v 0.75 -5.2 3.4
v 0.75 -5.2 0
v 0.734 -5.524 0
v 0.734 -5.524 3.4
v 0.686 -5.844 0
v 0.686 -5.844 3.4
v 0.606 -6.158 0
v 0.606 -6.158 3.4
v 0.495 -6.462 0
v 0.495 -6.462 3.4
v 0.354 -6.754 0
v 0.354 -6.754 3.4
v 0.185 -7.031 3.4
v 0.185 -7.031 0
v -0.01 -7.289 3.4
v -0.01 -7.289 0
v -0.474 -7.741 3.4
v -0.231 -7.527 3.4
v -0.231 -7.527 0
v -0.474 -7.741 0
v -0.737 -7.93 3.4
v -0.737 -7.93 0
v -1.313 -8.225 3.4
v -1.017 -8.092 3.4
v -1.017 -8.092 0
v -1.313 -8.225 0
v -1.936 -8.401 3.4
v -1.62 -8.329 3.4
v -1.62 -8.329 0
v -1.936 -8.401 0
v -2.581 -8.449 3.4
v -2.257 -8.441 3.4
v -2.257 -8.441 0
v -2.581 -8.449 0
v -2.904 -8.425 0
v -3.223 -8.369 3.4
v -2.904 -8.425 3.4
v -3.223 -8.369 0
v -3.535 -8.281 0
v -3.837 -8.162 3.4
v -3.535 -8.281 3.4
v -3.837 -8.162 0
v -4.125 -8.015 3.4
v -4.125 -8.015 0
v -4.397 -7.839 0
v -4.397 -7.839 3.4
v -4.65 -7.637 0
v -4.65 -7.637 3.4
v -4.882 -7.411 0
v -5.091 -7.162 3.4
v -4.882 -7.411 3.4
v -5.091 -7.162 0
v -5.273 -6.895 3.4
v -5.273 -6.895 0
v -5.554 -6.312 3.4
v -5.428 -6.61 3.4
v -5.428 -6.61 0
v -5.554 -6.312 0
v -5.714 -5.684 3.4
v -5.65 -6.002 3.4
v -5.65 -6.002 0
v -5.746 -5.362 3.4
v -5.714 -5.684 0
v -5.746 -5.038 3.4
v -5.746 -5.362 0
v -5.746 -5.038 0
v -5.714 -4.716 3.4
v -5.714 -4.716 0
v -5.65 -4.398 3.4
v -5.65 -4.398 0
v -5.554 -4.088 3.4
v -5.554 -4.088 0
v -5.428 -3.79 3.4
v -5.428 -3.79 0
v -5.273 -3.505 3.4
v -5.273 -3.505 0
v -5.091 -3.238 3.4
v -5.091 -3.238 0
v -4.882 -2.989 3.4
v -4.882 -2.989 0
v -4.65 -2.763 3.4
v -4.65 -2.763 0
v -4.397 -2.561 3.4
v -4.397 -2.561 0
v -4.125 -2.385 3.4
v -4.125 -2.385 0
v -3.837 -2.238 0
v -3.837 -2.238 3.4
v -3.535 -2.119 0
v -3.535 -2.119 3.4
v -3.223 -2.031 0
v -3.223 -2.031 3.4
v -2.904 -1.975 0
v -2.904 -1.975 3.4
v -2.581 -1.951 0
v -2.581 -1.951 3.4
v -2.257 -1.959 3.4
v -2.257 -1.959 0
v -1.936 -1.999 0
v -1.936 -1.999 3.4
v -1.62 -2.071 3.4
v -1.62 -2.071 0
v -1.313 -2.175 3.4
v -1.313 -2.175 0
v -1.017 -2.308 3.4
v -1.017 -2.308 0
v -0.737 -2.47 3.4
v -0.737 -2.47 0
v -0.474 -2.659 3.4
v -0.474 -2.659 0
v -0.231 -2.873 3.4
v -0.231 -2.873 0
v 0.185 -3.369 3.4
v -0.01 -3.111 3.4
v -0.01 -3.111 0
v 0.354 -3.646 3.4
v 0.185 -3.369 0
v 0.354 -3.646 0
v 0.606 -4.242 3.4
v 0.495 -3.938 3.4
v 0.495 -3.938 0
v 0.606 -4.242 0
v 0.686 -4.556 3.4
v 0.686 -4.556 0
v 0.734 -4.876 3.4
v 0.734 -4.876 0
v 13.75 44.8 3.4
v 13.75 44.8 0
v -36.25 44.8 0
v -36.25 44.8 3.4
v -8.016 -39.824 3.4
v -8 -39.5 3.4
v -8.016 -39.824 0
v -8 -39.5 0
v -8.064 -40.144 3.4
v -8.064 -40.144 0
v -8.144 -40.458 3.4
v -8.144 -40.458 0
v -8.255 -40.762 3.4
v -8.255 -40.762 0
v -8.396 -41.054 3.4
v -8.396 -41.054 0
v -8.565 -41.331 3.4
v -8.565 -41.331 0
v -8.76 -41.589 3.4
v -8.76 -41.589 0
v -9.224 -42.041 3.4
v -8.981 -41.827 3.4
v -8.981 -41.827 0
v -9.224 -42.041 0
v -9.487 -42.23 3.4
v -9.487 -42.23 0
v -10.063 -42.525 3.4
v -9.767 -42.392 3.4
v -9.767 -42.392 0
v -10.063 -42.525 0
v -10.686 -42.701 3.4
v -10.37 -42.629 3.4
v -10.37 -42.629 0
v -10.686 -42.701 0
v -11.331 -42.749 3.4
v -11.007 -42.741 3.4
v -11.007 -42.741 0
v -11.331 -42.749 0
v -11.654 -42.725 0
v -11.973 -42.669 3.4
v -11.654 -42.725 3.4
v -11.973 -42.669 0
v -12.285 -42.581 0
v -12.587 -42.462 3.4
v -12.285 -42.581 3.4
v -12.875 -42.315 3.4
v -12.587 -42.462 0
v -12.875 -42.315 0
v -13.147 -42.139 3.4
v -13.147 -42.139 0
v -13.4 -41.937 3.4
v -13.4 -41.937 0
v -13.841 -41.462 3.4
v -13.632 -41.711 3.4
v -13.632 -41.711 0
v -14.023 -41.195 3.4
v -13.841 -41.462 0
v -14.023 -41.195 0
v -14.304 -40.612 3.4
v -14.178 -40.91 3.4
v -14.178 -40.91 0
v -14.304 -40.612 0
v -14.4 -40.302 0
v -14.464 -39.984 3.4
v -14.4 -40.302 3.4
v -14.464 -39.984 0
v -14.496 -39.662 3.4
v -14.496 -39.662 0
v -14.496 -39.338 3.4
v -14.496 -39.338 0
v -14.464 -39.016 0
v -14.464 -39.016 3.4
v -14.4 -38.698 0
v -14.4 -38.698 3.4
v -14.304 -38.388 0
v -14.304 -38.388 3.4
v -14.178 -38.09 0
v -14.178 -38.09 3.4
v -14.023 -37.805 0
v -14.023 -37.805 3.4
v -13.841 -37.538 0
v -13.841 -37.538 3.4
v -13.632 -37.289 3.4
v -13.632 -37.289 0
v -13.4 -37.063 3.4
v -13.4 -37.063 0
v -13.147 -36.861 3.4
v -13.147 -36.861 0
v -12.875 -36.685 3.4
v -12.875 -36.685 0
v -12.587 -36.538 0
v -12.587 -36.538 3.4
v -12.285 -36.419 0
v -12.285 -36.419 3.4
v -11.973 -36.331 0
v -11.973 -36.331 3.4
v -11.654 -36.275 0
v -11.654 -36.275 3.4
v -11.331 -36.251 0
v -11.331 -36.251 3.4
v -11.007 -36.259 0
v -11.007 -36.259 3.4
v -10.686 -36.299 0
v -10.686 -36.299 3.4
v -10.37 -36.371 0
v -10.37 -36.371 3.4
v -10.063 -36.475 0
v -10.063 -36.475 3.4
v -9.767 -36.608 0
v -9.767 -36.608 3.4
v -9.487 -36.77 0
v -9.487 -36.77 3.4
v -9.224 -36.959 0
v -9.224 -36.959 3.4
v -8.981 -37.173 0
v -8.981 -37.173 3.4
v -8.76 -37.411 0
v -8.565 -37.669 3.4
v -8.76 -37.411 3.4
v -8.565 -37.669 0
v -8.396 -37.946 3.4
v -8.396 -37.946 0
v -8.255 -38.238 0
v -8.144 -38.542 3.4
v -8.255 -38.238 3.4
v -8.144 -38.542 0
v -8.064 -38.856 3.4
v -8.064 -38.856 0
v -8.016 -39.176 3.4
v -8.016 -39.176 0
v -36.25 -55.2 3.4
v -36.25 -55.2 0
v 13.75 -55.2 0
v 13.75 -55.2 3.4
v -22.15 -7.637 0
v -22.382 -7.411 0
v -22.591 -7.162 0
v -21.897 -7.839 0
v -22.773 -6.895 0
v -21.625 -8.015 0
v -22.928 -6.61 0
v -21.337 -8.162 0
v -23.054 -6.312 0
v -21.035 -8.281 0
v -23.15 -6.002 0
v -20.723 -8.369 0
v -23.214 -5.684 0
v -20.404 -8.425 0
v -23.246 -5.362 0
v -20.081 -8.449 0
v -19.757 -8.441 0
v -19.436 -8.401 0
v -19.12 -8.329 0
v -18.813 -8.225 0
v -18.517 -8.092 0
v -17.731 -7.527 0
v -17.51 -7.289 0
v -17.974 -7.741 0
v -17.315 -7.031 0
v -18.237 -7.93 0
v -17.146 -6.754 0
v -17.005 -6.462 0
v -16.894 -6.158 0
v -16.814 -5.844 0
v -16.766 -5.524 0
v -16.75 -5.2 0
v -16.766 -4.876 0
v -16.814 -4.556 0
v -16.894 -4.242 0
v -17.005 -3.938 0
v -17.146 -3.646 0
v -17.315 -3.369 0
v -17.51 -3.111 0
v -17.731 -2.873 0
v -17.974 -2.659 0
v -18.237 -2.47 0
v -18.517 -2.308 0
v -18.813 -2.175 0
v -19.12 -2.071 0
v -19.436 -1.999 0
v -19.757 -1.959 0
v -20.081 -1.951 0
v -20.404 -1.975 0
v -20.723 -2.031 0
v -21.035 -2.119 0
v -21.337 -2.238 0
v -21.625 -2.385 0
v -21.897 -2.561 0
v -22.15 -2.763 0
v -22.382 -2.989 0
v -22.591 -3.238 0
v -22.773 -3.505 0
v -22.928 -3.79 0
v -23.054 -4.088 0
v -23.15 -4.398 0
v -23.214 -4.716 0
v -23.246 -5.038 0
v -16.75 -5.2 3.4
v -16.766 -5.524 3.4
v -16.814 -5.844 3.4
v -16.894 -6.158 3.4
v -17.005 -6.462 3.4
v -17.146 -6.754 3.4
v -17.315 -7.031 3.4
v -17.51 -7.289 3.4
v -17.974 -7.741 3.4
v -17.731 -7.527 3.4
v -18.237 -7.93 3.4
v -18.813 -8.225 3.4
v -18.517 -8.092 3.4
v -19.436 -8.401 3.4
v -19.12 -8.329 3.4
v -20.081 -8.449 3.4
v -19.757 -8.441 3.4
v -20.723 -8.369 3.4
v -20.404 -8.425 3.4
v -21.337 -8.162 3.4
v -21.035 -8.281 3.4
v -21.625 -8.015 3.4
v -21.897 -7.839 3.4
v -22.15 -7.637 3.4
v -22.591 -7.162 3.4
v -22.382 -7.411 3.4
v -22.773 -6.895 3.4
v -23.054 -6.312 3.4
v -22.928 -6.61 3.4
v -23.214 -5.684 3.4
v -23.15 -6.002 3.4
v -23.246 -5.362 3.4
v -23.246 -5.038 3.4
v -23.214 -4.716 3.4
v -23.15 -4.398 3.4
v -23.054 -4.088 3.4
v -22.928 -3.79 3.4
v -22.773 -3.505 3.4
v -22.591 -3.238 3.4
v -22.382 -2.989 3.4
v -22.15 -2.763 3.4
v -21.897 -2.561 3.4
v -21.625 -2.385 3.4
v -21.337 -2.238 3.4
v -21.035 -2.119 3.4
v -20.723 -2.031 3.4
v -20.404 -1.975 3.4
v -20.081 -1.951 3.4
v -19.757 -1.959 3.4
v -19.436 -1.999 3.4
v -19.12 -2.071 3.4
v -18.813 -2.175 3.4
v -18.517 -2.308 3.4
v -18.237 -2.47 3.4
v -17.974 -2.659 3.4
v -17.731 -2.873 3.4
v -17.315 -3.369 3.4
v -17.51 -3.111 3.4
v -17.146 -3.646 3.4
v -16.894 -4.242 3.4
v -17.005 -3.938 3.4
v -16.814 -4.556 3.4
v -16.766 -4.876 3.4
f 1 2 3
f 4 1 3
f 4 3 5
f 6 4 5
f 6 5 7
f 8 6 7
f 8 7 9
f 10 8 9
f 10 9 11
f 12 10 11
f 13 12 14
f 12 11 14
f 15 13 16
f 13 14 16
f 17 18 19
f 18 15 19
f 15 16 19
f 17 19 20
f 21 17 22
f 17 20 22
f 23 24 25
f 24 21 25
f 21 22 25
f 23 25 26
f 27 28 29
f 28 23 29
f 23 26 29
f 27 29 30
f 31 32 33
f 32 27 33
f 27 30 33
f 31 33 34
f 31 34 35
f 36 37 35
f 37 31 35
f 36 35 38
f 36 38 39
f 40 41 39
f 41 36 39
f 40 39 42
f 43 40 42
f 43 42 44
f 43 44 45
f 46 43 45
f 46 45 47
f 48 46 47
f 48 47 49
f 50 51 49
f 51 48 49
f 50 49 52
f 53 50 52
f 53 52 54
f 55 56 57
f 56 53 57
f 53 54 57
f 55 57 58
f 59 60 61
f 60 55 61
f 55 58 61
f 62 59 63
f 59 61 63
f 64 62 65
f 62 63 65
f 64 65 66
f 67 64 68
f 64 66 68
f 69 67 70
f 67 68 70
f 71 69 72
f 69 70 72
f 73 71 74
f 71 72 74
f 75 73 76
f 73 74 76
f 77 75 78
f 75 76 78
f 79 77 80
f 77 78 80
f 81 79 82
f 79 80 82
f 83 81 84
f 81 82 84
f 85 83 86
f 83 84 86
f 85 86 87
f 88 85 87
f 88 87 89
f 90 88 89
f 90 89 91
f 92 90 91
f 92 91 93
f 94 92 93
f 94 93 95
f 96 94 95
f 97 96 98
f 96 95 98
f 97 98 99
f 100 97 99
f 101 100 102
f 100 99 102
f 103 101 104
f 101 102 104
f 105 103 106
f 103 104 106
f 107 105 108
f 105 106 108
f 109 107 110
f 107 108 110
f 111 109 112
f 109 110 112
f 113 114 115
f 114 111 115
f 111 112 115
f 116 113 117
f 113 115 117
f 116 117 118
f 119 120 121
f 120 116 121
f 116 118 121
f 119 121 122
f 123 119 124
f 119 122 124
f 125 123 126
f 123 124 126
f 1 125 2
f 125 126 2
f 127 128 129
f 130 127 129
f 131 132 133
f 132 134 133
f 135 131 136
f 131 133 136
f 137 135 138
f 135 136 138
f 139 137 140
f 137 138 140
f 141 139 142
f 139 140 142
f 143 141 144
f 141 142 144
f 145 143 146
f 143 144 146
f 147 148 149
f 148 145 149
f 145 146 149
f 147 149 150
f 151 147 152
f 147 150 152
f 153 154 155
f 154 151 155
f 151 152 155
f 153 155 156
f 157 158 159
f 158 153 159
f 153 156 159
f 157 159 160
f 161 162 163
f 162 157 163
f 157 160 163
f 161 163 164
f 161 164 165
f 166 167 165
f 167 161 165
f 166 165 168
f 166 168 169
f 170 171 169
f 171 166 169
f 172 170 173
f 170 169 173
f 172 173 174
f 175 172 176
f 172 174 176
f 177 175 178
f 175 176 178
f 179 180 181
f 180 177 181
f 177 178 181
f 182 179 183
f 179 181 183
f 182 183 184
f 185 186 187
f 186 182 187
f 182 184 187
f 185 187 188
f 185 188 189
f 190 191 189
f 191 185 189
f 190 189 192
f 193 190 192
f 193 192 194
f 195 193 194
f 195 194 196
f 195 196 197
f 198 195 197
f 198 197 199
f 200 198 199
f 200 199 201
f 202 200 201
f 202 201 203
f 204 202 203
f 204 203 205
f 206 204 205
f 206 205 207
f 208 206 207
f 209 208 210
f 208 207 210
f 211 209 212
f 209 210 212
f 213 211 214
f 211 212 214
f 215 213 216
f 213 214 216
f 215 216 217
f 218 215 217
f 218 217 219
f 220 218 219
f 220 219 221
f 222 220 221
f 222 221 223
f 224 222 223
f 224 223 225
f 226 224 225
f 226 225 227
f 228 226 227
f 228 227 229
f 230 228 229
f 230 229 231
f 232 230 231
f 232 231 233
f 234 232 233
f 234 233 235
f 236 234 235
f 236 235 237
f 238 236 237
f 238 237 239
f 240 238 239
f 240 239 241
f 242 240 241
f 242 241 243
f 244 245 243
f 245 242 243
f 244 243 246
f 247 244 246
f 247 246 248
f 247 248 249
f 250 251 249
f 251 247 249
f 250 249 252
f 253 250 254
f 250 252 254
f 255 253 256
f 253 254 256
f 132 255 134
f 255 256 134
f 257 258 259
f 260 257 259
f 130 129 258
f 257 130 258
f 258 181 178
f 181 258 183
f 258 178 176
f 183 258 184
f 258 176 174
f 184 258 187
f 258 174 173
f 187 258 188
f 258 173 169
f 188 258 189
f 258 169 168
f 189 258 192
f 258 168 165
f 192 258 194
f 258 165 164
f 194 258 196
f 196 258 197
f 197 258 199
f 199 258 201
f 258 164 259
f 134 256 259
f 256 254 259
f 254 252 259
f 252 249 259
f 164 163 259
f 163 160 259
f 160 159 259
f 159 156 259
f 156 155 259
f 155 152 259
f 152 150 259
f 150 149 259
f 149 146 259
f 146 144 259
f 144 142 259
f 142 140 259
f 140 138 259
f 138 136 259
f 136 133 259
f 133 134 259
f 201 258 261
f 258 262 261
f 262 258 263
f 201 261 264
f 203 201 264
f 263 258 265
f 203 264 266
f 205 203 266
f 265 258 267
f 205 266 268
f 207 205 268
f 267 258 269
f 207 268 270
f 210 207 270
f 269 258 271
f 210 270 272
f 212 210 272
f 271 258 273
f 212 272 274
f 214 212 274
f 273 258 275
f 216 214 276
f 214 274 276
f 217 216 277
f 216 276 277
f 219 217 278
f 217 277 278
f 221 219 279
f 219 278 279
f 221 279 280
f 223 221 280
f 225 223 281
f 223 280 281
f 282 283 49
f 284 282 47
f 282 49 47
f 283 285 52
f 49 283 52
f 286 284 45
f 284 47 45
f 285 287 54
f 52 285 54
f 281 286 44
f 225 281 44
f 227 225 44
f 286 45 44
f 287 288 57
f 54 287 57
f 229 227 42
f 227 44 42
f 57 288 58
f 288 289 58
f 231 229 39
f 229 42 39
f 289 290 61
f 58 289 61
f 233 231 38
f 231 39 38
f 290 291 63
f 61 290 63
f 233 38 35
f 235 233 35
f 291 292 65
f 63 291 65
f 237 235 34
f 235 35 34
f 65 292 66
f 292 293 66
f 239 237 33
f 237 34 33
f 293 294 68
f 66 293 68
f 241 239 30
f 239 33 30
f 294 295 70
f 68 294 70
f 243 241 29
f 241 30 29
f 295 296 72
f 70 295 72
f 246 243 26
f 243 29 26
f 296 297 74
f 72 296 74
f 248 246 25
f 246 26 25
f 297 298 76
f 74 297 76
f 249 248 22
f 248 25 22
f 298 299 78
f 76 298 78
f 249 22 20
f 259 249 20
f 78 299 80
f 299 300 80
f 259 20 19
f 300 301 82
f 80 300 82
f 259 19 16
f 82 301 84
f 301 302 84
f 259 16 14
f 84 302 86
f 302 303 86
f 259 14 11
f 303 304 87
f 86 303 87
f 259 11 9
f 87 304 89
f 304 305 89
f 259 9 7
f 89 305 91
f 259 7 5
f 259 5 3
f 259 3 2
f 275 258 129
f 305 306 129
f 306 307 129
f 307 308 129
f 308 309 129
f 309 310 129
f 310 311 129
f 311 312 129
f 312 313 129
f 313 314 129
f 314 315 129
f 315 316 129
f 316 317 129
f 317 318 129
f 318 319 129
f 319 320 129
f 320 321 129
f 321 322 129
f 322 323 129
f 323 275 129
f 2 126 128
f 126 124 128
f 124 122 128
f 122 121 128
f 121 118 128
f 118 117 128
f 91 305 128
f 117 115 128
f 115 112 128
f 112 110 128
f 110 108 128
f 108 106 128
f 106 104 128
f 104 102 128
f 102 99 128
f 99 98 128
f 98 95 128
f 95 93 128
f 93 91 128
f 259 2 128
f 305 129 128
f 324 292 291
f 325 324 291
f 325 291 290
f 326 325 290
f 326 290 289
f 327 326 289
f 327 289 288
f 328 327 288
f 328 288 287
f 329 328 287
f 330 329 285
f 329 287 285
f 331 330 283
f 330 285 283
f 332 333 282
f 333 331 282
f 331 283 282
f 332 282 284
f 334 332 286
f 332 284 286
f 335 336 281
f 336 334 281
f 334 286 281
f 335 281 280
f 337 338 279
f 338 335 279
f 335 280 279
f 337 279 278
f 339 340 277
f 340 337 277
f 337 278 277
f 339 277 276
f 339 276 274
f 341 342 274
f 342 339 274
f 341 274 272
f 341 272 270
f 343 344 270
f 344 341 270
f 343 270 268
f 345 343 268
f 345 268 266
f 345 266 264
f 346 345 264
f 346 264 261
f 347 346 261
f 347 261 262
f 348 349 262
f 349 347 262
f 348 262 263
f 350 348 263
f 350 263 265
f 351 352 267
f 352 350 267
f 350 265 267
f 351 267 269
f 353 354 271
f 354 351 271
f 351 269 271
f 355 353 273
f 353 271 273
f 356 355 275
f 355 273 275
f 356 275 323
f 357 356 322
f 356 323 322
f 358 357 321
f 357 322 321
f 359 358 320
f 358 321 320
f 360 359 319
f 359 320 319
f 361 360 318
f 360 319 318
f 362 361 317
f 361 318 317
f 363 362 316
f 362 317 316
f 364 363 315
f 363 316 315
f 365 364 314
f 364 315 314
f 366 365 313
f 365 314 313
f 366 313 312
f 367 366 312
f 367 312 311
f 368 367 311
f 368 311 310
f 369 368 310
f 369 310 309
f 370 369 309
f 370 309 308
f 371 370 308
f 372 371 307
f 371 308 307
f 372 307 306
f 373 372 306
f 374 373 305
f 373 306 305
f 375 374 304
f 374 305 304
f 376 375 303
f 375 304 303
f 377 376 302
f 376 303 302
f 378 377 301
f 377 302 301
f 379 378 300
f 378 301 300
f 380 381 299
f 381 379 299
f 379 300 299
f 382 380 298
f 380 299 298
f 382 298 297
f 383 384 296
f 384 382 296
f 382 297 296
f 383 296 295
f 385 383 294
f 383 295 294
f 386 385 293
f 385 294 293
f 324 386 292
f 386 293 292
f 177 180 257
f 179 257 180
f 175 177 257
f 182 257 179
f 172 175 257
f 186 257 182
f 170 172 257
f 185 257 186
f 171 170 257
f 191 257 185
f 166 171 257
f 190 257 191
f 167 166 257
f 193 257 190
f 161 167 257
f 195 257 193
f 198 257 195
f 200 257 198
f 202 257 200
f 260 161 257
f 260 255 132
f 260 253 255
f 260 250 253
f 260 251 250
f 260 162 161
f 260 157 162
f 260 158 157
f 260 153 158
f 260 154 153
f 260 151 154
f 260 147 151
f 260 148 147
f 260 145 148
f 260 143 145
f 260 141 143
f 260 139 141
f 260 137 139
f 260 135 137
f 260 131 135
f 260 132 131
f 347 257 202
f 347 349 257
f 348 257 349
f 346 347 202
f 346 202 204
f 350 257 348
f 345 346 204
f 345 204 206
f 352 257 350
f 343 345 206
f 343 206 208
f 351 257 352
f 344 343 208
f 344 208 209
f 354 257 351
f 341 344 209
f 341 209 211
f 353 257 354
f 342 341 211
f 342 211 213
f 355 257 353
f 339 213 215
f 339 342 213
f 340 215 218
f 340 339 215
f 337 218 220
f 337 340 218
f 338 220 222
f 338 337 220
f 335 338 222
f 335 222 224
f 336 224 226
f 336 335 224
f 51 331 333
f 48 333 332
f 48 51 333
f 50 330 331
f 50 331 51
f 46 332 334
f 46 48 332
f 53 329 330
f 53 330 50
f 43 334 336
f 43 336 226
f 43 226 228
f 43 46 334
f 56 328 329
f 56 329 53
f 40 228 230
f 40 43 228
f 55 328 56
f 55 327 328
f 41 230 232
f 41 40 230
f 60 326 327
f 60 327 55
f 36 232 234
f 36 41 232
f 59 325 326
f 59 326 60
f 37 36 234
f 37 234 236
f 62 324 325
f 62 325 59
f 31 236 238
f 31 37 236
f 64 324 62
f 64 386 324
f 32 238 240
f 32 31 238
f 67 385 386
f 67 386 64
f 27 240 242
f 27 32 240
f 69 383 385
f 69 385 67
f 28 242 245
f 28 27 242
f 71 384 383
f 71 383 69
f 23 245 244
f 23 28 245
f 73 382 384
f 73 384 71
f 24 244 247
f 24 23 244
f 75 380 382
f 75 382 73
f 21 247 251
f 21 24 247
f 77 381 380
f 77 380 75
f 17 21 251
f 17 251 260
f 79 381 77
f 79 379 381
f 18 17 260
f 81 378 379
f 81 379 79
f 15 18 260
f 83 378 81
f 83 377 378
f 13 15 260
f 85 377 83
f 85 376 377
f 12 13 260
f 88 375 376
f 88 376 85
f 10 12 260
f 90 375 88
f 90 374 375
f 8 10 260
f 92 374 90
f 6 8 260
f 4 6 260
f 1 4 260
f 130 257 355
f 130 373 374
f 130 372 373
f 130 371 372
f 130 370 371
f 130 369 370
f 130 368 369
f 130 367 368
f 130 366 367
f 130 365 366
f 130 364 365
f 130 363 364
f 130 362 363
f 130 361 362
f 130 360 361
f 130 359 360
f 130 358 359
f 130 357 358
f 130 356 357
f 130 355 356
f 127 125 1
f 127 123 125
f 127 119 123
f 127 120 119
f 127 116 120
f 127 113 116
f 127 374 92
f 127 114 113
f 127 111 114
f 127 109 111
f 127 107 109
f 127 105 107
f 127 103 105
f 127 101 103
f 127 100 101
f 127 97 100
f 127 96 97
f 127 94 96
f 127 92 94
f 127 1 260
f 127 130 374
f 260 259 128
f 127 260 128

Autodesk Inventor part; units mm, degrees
ref_plane "YZ Plane" through (0, 0, 0) normal (1, 0, 0) x (0, 1, 0)
ref_plane "XZ Plane" through (0, 0, 0) normal (0, 1, 0) x (-1, 0, 0)
ref_plane "XY Plane" through (0, 0, 0) normal (0, 0, 1) x (1, 0, 0)
sketch "Sketch1" plane through (0, 0, 0) normal (0, 0, 1) x (1, 0, 0)
  line L0 (13.75, 44.8) -> (-36.25, 44.8)
  line L1 (-36.25, 44.8) -> (-36.25, -55.2)
  line L2 (-36.25, -55.2) -> (13.75, -55.2)
  line L3 (13.75, -55.2) -> (13.75, 44.8)
  circle A0 centre (-2.5, -5.2) radius 2.5 construction
  circle A1 centre (-20, -5.2) radius 2.5 construction
  circle A2 centre (-11.25, -39.5) radius 2.5 construction
  circle A3 centre (-2.5, -5.2) radius 3.25
  circle A4 centre (-20, -5.2) radius 3.25
  circle A5 centre (-11.25, -39.5) radius 3.25
  point P0 (0, 0)
  dimension "d0" = 6.5
  dimension "d1" = 6.5
  dimension "d2" = 6.5
extrude "Extrusion1" add sketch "Sketch1" along normal blind 3.4
properties part number "Motor cover upper"
